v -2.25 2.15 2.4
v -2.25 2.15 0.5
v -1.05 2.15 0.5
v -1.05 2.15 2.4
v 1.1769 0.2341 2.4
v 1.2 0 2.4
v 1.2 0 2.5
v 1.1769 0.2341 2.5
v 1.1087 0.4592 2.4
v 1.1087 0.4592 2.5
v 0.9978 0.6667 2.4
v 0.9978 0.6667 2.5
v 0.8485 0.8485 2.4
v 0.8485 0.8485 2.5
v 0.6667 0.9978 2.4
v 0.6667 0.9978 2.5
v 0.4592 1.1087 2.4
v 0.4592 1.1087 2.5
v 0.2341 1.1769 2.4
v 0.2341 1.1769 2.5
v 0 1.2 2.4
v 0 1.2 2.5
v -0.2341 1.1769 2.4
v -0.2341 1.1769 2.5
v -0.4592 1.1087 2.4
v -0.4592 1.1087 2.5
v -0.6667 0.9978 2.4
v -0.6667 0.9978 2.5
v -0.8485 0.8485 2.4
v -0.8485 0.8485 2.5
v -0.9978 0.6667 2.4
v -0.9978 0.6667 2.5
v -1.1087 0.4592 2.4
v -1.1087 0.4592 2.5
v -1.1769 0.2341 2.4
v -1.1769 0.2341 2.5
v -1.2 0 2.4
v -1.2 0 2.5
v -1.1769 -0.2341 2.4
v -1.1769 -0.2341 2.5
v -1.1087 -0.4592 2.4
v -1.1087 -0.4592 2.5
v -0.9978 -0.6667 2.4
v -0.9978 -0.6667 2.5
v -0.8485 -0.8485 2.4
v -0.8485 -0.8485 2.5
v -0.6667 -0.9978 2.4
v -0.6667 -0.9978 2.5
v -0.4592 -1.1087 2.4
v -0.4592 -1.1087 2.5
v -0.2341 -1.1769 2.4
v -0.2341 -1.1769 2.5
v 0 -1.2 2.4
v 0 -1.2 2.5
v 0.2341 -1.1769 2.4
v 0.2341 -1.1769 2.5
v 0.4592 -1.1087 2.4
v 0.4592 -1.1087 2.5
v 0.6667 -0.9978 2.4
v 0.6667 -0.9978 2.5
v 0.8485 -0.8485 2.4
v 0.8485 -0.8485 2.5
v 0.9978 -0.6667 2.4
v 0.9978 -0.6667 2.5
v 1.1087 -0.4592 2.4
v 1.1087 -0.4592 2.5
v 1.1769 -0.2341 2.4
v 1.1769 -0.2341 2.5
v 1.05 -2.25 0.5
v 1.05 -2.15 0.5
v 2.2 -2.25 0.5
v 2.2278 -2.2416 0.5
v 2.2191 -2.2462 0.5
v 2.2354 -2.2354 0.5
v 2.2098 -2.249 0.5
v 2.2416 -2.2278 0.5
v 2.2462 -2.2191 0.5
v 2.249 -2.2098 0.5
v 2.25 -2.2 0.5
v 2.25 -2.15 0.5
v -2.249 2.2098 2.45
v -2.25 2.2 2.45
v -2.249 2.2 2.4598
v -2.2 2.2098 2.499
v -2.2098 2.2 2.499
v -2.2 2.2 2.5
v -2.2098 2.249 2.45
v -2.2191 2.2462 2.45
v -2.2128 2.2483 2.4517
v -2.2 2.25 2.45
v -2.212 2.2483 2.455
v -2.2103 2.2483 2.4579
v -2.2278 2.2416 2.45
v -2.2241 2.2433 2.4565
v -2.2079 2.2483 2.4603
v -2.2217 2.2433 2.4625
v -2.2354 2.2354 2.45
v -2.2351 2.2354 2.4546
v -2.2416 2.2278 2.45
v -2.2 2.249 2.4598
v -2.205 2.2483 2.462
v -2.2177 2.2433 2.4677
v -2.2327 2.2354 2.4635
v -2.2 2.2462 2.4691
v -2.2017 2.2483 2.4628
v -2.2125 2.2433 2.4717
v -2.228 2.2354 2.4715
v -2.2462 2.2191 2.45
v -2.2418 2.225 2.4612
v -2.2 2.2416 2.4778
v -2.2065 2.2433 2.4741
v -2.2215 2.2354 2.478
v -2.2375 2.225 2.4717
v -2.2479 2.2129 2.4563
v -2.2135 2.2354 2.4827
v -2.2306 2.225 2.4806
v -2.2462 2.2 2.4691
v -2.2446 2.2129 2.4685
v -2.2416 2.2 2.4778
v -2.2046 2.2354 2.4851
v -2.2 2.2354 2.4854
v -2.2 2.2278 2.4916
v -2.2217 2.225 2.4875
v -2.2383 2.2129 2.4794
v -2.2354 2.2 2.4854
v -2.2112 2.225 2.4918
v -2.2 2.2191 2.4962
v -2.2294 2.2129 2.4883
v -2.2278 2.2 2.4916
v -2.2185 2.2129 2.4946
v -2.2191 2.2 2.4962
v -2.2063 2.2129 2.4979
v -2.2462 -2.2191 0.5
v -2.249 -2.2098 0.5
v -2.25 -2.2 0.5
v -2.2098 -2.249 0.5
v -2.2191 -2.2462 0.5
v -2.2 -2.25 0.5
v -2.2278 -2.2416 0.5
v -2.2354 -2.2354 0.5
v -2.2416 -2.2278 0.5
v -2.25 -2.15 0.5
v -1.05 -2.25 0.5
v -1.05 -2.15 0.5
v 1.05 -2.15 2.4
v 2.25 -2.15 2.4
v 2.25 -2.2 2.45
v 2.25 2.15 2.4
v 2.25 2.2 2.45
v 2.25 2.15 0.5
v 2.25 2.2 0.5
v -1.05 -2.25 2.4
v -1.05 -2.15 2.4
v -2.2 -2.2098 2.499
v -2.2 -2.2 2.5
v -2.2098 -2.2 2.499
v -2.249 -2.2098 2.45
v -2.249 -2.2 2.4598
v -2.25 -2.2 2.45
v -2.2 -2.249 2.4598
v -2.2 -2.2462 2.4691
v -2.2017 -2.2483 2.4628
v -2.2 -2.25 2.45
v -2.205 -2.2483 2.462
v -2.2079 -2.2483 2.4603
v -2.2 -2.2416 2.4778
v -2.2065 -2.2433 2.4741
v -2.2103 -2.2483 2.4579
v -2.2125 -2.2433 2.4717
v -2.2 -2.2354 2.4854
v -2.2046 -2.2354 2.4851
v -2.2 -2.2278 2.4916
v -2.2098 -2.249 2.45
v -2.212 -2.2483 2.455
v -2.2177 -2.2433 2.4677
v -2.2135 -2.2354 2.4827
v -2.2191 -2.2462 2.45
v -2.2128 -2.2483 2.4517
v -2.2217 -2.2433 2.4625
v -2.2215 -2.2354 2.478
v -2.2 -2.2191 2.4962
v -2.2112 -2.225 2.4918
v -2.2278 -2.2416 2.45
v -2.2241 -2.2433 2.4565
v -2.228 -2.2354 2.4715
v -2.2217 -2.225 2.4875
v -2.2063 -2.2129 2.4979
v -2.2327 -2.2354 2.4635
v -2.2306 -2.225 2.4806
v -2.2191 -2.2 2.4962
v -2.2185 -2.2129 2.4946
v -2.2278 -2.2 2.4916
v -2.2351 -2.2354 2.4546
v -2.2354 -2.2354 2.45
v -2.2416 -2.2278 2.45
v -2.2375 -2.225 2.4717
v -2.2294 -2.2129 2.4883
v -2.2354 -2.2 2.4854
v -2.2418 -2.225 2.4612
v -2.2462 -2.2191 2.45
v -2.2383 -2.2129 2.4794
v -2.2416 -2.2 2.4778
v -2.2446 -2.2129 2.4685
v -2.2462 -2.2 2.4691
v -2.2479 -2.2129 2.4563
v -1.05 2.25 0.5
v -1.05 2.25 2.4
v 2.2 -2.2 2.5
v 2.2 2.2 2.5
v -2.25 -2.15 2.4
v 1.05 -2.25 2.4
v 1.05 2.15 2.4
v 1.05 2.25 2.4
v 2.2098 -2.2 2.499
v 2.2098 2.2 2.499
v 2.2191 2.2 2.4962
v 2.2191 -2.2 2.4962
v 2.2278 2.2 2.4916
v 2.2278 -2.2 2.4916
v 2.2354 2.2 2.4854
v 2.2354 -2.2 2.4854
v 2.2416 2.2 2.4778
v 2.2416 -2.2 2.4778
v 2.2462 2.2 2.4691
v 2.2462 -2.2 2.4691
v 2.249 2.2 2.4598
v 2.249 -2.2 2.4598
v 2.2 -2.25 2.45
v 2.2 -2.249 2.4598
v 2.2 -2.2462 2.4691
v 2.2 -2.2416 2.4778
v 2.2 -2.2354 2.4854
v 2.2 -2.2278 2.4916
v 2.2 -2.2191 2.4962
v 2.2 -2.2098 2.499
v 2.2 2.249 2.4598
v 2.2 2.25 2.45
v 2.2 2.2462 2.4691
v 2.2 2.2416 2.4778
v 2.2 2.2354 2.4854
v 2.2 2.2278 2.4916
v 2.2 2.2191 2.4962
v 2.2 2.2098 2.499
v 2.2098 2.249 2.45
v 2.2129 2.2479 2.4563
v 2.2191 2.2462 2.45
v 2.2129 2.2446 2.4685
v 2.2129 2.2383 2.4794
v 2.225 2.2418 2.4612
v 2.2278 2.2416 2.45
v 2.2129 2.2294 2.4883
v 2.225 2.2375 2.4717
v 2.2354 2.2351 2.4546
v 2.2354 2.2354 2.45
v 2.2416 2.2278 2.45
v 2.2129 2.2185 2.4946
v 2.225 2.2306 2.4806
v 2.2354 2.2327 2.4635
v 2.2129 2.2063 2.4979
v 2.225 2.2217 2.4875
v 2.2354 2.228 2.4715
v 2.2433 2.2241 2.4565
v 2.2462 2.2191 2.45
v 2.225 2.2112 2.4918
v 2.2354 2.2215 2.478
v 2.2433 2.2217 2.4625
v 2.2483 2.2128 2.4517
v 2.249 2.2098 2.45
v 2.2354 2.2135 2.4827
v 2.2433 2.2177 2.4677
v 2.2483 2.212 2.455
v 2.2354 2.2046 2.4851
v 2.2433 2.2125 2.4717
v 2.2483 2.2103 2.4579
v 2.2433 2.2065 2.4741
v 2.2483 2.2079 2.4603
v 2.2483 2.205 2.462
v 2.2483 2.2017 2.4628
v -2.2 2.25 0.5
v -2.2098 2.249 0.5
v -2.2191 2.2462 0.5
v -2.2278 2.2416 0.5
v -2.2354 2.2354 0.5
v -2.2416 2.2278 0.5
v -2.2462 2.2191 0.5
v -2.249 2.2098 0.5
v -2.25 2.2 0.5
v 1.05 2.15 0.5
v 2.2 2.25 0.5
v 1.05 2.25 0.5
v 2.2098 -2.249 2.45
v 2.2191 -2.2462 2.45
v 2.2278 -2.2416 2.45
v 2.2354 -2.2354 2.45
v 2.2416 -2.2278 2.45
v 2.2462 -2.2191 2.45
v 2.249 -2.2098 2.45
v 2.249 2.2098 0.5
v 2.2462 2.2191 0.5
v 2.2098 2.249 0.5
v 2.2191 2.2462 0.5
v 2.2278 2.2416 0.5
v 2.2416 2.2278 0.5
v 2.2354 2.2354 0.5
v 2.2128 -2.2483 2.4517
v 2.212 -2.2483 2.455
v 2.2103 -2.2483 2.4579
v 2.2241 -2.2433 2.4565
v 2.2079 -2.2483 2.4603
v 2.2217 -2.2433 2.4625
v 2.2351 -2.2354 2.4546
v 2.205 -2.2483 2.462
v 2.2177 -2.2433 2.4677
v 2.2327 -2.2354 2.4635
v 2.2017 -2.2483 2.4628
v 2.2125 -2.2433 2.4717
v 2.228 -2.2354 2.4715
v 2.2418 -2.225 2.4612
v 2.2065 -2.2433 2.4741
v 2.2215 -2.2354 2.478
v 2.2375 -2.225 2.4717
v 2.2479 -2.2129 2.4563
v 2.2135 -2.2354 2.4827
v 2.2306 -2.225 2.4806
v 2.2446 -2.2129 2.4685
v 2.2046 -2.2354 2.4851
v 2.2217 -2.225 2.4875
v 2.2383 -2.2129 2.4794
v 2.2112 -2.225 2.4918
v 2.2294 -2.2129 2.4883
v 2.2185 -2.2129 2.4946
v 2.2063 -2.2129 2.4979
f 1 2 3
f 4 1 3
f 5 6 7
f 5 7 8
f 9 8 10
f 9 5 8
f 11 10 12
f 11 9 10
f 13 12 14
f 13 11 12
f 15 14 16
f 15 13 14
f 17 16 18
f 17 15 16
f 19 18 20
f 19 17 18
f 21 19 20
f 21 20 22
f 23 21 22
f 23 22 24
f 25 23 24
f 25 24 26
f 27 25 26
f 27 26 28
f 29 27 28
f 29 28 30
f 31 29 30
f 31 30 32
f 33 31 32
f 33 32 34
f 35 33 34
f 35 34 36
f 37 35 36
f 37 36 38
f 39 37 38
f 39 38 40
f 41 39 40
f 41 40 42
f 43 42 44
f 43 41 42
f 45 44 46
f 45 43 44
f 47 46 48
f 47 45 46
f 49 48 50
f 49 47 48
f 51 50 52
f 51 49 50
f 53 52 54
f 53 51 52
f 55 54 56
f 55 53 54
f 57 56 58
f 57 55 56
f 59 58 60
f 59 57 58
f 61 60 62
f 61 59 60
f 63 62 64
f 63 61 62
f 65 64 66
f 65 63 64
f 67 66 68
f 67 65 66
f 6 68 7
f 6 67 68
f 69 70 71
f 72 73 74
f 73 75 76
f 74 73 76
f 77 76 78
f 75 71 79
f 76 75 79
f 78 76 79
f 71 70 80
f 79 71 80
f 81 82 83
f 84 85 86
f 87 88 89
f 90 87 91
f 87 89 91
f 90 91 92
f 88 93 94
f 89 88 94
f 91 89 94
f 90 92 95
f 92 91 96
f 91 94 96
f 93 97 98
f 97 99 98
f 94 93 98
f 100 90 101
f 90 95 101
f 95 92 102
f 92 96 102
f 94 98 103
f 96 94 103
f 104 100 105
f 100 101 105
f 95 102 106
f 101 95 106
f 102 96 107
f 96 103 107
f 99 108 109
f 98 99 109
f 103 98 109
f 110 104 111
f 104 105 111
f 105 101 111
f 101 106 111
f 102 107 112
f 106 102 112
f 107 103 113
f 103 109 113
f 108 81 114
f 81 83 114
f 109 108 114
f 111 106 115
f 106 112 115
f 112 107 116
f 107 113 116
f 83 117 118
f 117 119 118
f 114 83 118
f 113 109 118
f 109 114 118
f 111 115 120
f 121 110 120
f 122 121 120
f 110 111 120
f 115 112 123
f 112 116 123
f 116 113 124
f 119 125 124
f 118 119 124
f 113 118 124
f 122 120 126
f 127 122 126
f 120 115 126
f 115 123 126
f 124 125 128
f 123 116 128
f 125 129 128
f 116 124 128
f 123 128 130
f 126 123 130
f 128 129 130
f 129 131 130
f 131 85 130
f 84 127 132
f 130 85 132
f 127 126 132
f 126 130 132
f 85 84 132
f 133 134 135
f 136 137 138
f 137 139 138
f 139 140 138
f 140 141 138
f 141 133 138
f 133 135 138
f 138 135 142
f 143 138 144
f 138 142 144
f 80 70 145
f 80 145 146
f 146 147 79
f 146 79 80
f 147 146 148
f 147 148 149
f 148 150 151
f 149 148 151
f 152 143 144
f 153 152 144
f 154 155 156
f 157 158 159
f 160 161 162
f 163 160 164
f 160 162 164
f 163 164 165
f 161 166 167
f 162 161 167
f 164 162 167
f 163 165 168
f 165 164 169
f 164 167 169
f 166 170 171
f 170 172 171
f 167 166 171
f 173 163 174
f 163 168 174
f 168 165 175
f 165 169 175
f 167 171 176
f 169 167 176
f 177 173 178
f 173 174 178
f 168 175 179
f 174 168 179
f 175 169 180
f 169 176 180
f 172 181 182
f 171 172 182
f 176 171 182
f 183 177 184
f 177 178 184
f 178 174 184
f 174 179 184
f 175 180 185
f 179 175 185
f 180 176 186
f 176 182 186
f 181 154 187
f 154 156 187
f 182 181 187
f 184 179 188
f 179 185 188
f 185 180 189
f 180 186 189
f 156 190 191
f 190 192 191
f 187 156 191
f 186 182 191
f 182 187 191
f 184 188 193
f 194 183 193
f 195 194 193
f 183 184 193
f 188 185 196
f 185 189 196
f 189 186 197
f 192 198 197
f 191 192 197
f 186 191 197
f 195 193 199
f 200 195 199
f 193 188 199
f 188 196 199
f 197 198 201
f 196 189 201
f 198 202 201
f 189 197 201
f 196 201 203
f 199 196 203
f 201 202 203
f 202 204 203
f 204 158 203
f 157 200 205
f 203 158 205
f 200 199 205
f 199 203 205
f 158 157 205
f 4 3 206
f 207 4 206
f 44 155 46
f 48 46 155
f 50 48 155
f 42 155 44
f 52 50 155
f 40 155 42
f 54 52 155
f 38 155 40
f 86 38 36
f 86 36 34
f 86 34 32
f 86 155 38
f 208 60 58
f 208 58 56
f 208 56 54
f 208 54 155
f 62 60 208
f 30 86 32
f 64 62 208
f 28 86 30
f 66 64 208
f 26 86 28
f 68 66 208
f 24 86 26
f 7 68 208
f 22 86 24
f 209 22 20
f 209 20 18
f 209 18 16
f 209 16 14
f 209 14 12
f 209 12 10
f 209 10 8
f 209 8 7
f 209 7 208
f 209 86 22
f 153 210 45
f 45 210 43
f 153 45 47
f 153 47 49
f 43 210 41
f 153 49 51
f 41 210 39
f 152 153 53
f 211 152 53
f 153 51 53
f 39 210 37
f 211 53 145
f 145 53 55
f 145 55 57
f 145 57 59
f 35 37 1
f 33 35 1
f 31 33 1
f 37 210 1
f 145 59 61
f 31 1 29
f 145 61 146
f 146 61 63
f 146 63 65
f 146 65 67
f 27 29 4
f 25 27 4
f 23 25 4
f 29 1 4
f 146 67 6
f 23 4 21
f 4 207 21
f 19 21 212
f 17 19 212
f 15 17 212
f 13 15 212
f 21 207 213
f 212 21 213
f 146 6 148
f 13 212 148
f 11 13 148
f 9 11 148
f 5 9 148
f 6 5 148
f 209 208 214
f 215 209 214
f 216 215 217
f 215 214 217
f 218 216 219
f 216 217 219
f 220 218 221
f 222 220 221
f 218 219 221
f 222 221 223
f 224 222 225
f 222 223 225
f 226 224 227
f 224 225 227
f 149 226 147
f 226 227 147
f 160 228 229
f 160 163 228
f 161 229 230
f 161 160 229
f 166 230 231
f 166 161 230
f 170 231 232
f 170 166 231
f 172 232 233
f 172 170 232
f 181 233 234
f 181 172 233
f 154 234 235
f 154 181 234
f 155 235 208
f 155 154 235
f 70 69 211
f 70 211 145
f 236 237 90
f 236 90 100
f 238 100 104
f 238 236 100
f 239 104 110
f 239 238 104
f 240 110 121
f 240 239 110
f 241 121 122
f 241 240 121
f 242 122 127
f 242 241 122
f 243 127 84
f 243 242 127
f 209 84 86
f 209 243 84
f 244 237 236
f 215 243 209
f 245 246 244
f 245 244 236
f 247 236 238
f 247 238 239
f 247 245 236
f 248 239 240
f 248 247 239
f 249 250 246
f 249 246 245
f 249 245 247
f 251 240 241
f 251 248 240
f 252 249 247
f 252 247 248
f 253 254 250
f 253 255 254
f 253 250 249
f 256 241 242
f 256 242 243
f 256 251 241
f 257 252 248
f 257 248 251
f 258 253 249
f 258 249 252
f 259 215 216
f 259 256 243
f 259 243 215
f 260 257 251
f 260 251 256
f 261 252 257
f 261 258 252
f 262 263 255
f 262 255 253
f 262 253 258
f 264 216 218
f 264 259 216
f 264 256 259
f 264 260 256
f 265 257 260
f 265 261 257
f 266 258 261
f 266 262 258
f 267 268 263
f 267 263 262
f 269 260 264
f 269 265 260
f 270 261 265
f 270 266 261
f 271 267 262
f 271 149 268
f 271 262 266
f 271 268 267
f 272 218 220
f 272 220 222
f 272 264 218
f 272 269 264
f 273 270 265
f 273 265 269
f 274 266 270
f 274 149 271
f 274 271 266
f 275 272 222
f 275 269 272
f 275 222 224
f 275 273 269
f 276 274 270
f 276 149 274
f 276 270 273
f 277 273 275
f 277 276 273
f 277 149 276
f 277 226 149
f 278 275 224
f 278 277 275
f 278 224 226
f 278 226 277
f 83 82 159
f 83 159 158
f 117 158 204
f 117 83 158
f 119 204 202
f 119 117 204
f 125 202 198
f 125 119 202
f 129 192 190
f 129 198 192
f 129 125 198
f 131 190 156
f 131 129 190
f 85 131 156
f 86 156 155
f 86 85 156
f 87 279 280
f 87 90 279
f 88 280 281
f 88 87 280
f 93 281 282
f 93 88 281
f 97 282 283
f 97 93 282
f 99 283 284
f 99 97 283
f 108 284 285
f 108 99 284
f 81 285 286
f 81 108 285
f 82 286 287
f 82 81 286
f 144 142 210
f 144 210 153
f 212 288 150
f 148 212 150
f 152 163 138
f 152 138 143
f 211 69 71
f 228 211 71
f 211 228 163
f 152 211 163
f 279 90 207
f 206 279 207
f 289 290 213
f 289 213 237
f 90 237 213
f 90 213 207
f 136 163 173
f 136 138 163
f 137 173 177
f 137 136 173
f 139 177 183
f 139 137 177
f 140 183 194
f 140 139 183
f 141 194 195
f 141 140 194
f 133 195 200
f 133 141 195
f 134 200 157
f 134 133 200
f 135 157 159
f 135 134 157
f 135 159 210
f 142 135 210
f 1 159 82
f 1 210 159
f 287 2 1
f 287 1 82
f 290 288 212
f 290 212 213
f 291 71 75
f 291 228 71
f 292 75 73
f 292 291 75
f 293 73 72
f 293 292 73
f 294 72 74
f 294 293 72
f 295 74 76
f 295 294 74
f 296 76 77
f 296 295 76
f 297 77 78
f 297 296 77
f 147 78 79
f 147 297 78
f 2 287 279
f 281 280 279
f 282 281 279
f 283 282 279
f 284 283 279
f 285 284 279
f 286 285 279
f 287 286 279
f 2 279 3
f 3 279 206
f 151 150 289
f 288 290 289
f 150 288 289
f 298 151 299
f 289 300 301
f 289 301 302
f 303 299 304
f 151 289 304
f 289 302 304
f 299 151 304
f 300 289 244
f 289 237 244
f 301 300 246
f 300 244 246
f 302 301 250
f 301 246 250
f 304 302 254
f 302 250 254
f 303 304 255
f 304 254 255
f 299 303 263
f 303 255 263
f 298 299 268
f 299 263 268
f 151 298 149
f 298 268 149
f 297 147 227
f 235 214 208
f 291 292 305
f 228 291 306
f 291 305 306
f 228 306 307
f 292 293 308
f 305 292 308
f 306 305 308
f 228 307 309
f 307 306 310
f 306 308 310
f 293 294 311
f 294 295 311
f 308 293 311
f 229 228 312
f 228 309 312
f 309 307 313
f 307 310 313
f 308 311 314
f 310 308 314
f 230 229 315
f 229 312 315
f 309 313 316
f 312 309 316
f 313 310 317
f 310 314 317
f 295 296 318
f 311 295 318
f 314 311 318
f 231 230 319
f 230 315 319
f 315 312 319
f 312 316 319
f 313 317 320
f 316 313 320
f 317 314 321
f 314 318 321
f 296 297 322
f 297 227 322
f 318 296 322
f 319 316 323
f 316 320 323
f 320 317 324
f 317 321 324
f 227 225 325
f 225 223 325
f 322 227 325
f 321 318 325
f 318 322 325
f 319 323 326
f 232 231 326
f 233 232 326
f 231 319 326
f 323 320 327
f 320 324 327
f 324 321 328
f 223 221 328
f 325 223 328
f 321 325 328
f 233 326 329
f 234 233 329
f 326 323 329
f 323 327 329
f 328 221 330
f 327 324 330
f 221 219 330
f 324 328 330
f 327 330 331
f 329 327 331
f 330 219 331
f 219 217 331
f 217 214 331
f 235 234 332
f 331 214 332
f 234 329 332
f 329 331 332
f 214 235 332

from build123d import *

# Parameters (mm, degrees)
CYLINDER_R     = 1.2
CYLINDER_DEPTH = 2
BOX008_W       = 1.2
BOX008_H       = 0.1
BOX008_DEPTH   = 2
BOX002_W       = 1.2
BOX002_H       = 0.1
BOX002_DEPTH   = 2
BOX001_W       = 1.2
BOX001_H       = 0.1
BOX001_DEPTH   = 2
BOX007_W       = 1.2
BOX007_H       = 0.1
BOX007_DEPTH   = 2
BOX_W          = 4.5
BOX_H          = 4.5
BOX_DEPTH      = 0.1
FILLET001_R    = 0.05
FILLET002_R    = 0.05
FILLET003_R    = 0.05
FILLET004_R    = 0.05


with BuildPart() as cylinder:
    # Cylinder → Cylinder (new body)
    with BuildSketch(Plane.XY.offset(1)):
        Circle(CYLINDER_R)
    extrude(amount=CYLINDER_DEPTH)


with BuildPart() as kub008:
    # Box008 → Box008 (new body)
    with BuildSketch(Plane(origin=(-2.25, -2.25, 0.5), x_dir=(1, 0, 0), z_dir=(0, 0, 1))):
        with Locations((0.6, 0.05)):
            Rectangle(BOX008_W, BOX008_H)
    extrude(amount=BOX008_DEPTH)


with BuildPart() as kub002:
    # Box002 → Box002 (new body)
    with BuildSketch(Plane(origin=(1.05, 2.15, 0.5), x_dir=(1, 0, 0), z_dir=(0, 0, 1))):
        with Locations((0.6, 0.05)):
            Rectangle(BOX002_W, BOX002_H)
    extrude(amount=BOX002_DEPTH)


with BuildPart() as kub001:
    # Box001 → Box001 (new body)
    with BuildSketch(Plane(origin=(-2.25, 2.15, 0.5), x_dir=(1, 0, 0), z_dir=(0, 0, 1))):
        with Locations((0.6, 0.05)):
            Rectangle(BOX001_W, BOX001_H)
    extrude(amount=BOX001_DEPTH)


with BuildPart() as kub007:
    # Box007 → Box007 (new body)
    with BuildSketch(Plane(origin=(1.05, -2.25, 0.5), x_dir=(1, 0, 0), z_dir=(0, 0, 1))):
        with Locations((0.6, 0.05)):
            Rectangle(BOX007_W, BOX007_H)
    extrude(amount=BOX007_DEPTH)


with BuildPart() as cut004:
    # Box → Box (new body)
    with BuildSketch(Plane(origin=(-2.25, -2.25, 2.4), x_dir=(1, 0, 0), z_dir=(0, 0, 1))):
        with Locations((2.25, 2.25)):
            Rectangle(BOX_W, BOX_H)
    extrude(amount=BOX_DEPTH)

    # Fusion: union Kub007
    add(kub007.part)

    # Fusion001: union Kub001
    add(kub001.part)

    # Fusion002: union Kub002
    add(kub002.part)

    # Fusion003: union Kub008
    add(kub008.part)

    # Fillet001
    fillet001_edges = [cut004.edges().sort_by_distance(p)[0] for p in [
        (-2.25, 0, 2.5),
    ]]
    fillet(fillet001_edges, radius=FILLET001_R)

    # Fillet002
    fillet002_edges = [cut004.edges().sort_by_distance(p)[0] for p in [
        (0, 2.25, 2.5),
    ]]
    fillet(fillet002_edges, radius=FILLET002_R)

    # Fillet003
    fillet003_edges = [cut004.edges().sort_by_distance(p)[0] for p in [
        (2.25, 0, 2.5),
    ]]
    fillet(fillet003_edges, radius=FILLET003_R)

    # Fillet004
    fillet004_edges = [cut004.edges().sort_by_distance(p)[0] for p in [
        (0, -2.25, 2.5),
    ]]
    fillet(fillet004_edges, radius=FILLET004_R)

    # Cut004: cut Cylinder
    add(cylinder.part, mode=Mode.SUBTRACT)


solid = cut004.part
